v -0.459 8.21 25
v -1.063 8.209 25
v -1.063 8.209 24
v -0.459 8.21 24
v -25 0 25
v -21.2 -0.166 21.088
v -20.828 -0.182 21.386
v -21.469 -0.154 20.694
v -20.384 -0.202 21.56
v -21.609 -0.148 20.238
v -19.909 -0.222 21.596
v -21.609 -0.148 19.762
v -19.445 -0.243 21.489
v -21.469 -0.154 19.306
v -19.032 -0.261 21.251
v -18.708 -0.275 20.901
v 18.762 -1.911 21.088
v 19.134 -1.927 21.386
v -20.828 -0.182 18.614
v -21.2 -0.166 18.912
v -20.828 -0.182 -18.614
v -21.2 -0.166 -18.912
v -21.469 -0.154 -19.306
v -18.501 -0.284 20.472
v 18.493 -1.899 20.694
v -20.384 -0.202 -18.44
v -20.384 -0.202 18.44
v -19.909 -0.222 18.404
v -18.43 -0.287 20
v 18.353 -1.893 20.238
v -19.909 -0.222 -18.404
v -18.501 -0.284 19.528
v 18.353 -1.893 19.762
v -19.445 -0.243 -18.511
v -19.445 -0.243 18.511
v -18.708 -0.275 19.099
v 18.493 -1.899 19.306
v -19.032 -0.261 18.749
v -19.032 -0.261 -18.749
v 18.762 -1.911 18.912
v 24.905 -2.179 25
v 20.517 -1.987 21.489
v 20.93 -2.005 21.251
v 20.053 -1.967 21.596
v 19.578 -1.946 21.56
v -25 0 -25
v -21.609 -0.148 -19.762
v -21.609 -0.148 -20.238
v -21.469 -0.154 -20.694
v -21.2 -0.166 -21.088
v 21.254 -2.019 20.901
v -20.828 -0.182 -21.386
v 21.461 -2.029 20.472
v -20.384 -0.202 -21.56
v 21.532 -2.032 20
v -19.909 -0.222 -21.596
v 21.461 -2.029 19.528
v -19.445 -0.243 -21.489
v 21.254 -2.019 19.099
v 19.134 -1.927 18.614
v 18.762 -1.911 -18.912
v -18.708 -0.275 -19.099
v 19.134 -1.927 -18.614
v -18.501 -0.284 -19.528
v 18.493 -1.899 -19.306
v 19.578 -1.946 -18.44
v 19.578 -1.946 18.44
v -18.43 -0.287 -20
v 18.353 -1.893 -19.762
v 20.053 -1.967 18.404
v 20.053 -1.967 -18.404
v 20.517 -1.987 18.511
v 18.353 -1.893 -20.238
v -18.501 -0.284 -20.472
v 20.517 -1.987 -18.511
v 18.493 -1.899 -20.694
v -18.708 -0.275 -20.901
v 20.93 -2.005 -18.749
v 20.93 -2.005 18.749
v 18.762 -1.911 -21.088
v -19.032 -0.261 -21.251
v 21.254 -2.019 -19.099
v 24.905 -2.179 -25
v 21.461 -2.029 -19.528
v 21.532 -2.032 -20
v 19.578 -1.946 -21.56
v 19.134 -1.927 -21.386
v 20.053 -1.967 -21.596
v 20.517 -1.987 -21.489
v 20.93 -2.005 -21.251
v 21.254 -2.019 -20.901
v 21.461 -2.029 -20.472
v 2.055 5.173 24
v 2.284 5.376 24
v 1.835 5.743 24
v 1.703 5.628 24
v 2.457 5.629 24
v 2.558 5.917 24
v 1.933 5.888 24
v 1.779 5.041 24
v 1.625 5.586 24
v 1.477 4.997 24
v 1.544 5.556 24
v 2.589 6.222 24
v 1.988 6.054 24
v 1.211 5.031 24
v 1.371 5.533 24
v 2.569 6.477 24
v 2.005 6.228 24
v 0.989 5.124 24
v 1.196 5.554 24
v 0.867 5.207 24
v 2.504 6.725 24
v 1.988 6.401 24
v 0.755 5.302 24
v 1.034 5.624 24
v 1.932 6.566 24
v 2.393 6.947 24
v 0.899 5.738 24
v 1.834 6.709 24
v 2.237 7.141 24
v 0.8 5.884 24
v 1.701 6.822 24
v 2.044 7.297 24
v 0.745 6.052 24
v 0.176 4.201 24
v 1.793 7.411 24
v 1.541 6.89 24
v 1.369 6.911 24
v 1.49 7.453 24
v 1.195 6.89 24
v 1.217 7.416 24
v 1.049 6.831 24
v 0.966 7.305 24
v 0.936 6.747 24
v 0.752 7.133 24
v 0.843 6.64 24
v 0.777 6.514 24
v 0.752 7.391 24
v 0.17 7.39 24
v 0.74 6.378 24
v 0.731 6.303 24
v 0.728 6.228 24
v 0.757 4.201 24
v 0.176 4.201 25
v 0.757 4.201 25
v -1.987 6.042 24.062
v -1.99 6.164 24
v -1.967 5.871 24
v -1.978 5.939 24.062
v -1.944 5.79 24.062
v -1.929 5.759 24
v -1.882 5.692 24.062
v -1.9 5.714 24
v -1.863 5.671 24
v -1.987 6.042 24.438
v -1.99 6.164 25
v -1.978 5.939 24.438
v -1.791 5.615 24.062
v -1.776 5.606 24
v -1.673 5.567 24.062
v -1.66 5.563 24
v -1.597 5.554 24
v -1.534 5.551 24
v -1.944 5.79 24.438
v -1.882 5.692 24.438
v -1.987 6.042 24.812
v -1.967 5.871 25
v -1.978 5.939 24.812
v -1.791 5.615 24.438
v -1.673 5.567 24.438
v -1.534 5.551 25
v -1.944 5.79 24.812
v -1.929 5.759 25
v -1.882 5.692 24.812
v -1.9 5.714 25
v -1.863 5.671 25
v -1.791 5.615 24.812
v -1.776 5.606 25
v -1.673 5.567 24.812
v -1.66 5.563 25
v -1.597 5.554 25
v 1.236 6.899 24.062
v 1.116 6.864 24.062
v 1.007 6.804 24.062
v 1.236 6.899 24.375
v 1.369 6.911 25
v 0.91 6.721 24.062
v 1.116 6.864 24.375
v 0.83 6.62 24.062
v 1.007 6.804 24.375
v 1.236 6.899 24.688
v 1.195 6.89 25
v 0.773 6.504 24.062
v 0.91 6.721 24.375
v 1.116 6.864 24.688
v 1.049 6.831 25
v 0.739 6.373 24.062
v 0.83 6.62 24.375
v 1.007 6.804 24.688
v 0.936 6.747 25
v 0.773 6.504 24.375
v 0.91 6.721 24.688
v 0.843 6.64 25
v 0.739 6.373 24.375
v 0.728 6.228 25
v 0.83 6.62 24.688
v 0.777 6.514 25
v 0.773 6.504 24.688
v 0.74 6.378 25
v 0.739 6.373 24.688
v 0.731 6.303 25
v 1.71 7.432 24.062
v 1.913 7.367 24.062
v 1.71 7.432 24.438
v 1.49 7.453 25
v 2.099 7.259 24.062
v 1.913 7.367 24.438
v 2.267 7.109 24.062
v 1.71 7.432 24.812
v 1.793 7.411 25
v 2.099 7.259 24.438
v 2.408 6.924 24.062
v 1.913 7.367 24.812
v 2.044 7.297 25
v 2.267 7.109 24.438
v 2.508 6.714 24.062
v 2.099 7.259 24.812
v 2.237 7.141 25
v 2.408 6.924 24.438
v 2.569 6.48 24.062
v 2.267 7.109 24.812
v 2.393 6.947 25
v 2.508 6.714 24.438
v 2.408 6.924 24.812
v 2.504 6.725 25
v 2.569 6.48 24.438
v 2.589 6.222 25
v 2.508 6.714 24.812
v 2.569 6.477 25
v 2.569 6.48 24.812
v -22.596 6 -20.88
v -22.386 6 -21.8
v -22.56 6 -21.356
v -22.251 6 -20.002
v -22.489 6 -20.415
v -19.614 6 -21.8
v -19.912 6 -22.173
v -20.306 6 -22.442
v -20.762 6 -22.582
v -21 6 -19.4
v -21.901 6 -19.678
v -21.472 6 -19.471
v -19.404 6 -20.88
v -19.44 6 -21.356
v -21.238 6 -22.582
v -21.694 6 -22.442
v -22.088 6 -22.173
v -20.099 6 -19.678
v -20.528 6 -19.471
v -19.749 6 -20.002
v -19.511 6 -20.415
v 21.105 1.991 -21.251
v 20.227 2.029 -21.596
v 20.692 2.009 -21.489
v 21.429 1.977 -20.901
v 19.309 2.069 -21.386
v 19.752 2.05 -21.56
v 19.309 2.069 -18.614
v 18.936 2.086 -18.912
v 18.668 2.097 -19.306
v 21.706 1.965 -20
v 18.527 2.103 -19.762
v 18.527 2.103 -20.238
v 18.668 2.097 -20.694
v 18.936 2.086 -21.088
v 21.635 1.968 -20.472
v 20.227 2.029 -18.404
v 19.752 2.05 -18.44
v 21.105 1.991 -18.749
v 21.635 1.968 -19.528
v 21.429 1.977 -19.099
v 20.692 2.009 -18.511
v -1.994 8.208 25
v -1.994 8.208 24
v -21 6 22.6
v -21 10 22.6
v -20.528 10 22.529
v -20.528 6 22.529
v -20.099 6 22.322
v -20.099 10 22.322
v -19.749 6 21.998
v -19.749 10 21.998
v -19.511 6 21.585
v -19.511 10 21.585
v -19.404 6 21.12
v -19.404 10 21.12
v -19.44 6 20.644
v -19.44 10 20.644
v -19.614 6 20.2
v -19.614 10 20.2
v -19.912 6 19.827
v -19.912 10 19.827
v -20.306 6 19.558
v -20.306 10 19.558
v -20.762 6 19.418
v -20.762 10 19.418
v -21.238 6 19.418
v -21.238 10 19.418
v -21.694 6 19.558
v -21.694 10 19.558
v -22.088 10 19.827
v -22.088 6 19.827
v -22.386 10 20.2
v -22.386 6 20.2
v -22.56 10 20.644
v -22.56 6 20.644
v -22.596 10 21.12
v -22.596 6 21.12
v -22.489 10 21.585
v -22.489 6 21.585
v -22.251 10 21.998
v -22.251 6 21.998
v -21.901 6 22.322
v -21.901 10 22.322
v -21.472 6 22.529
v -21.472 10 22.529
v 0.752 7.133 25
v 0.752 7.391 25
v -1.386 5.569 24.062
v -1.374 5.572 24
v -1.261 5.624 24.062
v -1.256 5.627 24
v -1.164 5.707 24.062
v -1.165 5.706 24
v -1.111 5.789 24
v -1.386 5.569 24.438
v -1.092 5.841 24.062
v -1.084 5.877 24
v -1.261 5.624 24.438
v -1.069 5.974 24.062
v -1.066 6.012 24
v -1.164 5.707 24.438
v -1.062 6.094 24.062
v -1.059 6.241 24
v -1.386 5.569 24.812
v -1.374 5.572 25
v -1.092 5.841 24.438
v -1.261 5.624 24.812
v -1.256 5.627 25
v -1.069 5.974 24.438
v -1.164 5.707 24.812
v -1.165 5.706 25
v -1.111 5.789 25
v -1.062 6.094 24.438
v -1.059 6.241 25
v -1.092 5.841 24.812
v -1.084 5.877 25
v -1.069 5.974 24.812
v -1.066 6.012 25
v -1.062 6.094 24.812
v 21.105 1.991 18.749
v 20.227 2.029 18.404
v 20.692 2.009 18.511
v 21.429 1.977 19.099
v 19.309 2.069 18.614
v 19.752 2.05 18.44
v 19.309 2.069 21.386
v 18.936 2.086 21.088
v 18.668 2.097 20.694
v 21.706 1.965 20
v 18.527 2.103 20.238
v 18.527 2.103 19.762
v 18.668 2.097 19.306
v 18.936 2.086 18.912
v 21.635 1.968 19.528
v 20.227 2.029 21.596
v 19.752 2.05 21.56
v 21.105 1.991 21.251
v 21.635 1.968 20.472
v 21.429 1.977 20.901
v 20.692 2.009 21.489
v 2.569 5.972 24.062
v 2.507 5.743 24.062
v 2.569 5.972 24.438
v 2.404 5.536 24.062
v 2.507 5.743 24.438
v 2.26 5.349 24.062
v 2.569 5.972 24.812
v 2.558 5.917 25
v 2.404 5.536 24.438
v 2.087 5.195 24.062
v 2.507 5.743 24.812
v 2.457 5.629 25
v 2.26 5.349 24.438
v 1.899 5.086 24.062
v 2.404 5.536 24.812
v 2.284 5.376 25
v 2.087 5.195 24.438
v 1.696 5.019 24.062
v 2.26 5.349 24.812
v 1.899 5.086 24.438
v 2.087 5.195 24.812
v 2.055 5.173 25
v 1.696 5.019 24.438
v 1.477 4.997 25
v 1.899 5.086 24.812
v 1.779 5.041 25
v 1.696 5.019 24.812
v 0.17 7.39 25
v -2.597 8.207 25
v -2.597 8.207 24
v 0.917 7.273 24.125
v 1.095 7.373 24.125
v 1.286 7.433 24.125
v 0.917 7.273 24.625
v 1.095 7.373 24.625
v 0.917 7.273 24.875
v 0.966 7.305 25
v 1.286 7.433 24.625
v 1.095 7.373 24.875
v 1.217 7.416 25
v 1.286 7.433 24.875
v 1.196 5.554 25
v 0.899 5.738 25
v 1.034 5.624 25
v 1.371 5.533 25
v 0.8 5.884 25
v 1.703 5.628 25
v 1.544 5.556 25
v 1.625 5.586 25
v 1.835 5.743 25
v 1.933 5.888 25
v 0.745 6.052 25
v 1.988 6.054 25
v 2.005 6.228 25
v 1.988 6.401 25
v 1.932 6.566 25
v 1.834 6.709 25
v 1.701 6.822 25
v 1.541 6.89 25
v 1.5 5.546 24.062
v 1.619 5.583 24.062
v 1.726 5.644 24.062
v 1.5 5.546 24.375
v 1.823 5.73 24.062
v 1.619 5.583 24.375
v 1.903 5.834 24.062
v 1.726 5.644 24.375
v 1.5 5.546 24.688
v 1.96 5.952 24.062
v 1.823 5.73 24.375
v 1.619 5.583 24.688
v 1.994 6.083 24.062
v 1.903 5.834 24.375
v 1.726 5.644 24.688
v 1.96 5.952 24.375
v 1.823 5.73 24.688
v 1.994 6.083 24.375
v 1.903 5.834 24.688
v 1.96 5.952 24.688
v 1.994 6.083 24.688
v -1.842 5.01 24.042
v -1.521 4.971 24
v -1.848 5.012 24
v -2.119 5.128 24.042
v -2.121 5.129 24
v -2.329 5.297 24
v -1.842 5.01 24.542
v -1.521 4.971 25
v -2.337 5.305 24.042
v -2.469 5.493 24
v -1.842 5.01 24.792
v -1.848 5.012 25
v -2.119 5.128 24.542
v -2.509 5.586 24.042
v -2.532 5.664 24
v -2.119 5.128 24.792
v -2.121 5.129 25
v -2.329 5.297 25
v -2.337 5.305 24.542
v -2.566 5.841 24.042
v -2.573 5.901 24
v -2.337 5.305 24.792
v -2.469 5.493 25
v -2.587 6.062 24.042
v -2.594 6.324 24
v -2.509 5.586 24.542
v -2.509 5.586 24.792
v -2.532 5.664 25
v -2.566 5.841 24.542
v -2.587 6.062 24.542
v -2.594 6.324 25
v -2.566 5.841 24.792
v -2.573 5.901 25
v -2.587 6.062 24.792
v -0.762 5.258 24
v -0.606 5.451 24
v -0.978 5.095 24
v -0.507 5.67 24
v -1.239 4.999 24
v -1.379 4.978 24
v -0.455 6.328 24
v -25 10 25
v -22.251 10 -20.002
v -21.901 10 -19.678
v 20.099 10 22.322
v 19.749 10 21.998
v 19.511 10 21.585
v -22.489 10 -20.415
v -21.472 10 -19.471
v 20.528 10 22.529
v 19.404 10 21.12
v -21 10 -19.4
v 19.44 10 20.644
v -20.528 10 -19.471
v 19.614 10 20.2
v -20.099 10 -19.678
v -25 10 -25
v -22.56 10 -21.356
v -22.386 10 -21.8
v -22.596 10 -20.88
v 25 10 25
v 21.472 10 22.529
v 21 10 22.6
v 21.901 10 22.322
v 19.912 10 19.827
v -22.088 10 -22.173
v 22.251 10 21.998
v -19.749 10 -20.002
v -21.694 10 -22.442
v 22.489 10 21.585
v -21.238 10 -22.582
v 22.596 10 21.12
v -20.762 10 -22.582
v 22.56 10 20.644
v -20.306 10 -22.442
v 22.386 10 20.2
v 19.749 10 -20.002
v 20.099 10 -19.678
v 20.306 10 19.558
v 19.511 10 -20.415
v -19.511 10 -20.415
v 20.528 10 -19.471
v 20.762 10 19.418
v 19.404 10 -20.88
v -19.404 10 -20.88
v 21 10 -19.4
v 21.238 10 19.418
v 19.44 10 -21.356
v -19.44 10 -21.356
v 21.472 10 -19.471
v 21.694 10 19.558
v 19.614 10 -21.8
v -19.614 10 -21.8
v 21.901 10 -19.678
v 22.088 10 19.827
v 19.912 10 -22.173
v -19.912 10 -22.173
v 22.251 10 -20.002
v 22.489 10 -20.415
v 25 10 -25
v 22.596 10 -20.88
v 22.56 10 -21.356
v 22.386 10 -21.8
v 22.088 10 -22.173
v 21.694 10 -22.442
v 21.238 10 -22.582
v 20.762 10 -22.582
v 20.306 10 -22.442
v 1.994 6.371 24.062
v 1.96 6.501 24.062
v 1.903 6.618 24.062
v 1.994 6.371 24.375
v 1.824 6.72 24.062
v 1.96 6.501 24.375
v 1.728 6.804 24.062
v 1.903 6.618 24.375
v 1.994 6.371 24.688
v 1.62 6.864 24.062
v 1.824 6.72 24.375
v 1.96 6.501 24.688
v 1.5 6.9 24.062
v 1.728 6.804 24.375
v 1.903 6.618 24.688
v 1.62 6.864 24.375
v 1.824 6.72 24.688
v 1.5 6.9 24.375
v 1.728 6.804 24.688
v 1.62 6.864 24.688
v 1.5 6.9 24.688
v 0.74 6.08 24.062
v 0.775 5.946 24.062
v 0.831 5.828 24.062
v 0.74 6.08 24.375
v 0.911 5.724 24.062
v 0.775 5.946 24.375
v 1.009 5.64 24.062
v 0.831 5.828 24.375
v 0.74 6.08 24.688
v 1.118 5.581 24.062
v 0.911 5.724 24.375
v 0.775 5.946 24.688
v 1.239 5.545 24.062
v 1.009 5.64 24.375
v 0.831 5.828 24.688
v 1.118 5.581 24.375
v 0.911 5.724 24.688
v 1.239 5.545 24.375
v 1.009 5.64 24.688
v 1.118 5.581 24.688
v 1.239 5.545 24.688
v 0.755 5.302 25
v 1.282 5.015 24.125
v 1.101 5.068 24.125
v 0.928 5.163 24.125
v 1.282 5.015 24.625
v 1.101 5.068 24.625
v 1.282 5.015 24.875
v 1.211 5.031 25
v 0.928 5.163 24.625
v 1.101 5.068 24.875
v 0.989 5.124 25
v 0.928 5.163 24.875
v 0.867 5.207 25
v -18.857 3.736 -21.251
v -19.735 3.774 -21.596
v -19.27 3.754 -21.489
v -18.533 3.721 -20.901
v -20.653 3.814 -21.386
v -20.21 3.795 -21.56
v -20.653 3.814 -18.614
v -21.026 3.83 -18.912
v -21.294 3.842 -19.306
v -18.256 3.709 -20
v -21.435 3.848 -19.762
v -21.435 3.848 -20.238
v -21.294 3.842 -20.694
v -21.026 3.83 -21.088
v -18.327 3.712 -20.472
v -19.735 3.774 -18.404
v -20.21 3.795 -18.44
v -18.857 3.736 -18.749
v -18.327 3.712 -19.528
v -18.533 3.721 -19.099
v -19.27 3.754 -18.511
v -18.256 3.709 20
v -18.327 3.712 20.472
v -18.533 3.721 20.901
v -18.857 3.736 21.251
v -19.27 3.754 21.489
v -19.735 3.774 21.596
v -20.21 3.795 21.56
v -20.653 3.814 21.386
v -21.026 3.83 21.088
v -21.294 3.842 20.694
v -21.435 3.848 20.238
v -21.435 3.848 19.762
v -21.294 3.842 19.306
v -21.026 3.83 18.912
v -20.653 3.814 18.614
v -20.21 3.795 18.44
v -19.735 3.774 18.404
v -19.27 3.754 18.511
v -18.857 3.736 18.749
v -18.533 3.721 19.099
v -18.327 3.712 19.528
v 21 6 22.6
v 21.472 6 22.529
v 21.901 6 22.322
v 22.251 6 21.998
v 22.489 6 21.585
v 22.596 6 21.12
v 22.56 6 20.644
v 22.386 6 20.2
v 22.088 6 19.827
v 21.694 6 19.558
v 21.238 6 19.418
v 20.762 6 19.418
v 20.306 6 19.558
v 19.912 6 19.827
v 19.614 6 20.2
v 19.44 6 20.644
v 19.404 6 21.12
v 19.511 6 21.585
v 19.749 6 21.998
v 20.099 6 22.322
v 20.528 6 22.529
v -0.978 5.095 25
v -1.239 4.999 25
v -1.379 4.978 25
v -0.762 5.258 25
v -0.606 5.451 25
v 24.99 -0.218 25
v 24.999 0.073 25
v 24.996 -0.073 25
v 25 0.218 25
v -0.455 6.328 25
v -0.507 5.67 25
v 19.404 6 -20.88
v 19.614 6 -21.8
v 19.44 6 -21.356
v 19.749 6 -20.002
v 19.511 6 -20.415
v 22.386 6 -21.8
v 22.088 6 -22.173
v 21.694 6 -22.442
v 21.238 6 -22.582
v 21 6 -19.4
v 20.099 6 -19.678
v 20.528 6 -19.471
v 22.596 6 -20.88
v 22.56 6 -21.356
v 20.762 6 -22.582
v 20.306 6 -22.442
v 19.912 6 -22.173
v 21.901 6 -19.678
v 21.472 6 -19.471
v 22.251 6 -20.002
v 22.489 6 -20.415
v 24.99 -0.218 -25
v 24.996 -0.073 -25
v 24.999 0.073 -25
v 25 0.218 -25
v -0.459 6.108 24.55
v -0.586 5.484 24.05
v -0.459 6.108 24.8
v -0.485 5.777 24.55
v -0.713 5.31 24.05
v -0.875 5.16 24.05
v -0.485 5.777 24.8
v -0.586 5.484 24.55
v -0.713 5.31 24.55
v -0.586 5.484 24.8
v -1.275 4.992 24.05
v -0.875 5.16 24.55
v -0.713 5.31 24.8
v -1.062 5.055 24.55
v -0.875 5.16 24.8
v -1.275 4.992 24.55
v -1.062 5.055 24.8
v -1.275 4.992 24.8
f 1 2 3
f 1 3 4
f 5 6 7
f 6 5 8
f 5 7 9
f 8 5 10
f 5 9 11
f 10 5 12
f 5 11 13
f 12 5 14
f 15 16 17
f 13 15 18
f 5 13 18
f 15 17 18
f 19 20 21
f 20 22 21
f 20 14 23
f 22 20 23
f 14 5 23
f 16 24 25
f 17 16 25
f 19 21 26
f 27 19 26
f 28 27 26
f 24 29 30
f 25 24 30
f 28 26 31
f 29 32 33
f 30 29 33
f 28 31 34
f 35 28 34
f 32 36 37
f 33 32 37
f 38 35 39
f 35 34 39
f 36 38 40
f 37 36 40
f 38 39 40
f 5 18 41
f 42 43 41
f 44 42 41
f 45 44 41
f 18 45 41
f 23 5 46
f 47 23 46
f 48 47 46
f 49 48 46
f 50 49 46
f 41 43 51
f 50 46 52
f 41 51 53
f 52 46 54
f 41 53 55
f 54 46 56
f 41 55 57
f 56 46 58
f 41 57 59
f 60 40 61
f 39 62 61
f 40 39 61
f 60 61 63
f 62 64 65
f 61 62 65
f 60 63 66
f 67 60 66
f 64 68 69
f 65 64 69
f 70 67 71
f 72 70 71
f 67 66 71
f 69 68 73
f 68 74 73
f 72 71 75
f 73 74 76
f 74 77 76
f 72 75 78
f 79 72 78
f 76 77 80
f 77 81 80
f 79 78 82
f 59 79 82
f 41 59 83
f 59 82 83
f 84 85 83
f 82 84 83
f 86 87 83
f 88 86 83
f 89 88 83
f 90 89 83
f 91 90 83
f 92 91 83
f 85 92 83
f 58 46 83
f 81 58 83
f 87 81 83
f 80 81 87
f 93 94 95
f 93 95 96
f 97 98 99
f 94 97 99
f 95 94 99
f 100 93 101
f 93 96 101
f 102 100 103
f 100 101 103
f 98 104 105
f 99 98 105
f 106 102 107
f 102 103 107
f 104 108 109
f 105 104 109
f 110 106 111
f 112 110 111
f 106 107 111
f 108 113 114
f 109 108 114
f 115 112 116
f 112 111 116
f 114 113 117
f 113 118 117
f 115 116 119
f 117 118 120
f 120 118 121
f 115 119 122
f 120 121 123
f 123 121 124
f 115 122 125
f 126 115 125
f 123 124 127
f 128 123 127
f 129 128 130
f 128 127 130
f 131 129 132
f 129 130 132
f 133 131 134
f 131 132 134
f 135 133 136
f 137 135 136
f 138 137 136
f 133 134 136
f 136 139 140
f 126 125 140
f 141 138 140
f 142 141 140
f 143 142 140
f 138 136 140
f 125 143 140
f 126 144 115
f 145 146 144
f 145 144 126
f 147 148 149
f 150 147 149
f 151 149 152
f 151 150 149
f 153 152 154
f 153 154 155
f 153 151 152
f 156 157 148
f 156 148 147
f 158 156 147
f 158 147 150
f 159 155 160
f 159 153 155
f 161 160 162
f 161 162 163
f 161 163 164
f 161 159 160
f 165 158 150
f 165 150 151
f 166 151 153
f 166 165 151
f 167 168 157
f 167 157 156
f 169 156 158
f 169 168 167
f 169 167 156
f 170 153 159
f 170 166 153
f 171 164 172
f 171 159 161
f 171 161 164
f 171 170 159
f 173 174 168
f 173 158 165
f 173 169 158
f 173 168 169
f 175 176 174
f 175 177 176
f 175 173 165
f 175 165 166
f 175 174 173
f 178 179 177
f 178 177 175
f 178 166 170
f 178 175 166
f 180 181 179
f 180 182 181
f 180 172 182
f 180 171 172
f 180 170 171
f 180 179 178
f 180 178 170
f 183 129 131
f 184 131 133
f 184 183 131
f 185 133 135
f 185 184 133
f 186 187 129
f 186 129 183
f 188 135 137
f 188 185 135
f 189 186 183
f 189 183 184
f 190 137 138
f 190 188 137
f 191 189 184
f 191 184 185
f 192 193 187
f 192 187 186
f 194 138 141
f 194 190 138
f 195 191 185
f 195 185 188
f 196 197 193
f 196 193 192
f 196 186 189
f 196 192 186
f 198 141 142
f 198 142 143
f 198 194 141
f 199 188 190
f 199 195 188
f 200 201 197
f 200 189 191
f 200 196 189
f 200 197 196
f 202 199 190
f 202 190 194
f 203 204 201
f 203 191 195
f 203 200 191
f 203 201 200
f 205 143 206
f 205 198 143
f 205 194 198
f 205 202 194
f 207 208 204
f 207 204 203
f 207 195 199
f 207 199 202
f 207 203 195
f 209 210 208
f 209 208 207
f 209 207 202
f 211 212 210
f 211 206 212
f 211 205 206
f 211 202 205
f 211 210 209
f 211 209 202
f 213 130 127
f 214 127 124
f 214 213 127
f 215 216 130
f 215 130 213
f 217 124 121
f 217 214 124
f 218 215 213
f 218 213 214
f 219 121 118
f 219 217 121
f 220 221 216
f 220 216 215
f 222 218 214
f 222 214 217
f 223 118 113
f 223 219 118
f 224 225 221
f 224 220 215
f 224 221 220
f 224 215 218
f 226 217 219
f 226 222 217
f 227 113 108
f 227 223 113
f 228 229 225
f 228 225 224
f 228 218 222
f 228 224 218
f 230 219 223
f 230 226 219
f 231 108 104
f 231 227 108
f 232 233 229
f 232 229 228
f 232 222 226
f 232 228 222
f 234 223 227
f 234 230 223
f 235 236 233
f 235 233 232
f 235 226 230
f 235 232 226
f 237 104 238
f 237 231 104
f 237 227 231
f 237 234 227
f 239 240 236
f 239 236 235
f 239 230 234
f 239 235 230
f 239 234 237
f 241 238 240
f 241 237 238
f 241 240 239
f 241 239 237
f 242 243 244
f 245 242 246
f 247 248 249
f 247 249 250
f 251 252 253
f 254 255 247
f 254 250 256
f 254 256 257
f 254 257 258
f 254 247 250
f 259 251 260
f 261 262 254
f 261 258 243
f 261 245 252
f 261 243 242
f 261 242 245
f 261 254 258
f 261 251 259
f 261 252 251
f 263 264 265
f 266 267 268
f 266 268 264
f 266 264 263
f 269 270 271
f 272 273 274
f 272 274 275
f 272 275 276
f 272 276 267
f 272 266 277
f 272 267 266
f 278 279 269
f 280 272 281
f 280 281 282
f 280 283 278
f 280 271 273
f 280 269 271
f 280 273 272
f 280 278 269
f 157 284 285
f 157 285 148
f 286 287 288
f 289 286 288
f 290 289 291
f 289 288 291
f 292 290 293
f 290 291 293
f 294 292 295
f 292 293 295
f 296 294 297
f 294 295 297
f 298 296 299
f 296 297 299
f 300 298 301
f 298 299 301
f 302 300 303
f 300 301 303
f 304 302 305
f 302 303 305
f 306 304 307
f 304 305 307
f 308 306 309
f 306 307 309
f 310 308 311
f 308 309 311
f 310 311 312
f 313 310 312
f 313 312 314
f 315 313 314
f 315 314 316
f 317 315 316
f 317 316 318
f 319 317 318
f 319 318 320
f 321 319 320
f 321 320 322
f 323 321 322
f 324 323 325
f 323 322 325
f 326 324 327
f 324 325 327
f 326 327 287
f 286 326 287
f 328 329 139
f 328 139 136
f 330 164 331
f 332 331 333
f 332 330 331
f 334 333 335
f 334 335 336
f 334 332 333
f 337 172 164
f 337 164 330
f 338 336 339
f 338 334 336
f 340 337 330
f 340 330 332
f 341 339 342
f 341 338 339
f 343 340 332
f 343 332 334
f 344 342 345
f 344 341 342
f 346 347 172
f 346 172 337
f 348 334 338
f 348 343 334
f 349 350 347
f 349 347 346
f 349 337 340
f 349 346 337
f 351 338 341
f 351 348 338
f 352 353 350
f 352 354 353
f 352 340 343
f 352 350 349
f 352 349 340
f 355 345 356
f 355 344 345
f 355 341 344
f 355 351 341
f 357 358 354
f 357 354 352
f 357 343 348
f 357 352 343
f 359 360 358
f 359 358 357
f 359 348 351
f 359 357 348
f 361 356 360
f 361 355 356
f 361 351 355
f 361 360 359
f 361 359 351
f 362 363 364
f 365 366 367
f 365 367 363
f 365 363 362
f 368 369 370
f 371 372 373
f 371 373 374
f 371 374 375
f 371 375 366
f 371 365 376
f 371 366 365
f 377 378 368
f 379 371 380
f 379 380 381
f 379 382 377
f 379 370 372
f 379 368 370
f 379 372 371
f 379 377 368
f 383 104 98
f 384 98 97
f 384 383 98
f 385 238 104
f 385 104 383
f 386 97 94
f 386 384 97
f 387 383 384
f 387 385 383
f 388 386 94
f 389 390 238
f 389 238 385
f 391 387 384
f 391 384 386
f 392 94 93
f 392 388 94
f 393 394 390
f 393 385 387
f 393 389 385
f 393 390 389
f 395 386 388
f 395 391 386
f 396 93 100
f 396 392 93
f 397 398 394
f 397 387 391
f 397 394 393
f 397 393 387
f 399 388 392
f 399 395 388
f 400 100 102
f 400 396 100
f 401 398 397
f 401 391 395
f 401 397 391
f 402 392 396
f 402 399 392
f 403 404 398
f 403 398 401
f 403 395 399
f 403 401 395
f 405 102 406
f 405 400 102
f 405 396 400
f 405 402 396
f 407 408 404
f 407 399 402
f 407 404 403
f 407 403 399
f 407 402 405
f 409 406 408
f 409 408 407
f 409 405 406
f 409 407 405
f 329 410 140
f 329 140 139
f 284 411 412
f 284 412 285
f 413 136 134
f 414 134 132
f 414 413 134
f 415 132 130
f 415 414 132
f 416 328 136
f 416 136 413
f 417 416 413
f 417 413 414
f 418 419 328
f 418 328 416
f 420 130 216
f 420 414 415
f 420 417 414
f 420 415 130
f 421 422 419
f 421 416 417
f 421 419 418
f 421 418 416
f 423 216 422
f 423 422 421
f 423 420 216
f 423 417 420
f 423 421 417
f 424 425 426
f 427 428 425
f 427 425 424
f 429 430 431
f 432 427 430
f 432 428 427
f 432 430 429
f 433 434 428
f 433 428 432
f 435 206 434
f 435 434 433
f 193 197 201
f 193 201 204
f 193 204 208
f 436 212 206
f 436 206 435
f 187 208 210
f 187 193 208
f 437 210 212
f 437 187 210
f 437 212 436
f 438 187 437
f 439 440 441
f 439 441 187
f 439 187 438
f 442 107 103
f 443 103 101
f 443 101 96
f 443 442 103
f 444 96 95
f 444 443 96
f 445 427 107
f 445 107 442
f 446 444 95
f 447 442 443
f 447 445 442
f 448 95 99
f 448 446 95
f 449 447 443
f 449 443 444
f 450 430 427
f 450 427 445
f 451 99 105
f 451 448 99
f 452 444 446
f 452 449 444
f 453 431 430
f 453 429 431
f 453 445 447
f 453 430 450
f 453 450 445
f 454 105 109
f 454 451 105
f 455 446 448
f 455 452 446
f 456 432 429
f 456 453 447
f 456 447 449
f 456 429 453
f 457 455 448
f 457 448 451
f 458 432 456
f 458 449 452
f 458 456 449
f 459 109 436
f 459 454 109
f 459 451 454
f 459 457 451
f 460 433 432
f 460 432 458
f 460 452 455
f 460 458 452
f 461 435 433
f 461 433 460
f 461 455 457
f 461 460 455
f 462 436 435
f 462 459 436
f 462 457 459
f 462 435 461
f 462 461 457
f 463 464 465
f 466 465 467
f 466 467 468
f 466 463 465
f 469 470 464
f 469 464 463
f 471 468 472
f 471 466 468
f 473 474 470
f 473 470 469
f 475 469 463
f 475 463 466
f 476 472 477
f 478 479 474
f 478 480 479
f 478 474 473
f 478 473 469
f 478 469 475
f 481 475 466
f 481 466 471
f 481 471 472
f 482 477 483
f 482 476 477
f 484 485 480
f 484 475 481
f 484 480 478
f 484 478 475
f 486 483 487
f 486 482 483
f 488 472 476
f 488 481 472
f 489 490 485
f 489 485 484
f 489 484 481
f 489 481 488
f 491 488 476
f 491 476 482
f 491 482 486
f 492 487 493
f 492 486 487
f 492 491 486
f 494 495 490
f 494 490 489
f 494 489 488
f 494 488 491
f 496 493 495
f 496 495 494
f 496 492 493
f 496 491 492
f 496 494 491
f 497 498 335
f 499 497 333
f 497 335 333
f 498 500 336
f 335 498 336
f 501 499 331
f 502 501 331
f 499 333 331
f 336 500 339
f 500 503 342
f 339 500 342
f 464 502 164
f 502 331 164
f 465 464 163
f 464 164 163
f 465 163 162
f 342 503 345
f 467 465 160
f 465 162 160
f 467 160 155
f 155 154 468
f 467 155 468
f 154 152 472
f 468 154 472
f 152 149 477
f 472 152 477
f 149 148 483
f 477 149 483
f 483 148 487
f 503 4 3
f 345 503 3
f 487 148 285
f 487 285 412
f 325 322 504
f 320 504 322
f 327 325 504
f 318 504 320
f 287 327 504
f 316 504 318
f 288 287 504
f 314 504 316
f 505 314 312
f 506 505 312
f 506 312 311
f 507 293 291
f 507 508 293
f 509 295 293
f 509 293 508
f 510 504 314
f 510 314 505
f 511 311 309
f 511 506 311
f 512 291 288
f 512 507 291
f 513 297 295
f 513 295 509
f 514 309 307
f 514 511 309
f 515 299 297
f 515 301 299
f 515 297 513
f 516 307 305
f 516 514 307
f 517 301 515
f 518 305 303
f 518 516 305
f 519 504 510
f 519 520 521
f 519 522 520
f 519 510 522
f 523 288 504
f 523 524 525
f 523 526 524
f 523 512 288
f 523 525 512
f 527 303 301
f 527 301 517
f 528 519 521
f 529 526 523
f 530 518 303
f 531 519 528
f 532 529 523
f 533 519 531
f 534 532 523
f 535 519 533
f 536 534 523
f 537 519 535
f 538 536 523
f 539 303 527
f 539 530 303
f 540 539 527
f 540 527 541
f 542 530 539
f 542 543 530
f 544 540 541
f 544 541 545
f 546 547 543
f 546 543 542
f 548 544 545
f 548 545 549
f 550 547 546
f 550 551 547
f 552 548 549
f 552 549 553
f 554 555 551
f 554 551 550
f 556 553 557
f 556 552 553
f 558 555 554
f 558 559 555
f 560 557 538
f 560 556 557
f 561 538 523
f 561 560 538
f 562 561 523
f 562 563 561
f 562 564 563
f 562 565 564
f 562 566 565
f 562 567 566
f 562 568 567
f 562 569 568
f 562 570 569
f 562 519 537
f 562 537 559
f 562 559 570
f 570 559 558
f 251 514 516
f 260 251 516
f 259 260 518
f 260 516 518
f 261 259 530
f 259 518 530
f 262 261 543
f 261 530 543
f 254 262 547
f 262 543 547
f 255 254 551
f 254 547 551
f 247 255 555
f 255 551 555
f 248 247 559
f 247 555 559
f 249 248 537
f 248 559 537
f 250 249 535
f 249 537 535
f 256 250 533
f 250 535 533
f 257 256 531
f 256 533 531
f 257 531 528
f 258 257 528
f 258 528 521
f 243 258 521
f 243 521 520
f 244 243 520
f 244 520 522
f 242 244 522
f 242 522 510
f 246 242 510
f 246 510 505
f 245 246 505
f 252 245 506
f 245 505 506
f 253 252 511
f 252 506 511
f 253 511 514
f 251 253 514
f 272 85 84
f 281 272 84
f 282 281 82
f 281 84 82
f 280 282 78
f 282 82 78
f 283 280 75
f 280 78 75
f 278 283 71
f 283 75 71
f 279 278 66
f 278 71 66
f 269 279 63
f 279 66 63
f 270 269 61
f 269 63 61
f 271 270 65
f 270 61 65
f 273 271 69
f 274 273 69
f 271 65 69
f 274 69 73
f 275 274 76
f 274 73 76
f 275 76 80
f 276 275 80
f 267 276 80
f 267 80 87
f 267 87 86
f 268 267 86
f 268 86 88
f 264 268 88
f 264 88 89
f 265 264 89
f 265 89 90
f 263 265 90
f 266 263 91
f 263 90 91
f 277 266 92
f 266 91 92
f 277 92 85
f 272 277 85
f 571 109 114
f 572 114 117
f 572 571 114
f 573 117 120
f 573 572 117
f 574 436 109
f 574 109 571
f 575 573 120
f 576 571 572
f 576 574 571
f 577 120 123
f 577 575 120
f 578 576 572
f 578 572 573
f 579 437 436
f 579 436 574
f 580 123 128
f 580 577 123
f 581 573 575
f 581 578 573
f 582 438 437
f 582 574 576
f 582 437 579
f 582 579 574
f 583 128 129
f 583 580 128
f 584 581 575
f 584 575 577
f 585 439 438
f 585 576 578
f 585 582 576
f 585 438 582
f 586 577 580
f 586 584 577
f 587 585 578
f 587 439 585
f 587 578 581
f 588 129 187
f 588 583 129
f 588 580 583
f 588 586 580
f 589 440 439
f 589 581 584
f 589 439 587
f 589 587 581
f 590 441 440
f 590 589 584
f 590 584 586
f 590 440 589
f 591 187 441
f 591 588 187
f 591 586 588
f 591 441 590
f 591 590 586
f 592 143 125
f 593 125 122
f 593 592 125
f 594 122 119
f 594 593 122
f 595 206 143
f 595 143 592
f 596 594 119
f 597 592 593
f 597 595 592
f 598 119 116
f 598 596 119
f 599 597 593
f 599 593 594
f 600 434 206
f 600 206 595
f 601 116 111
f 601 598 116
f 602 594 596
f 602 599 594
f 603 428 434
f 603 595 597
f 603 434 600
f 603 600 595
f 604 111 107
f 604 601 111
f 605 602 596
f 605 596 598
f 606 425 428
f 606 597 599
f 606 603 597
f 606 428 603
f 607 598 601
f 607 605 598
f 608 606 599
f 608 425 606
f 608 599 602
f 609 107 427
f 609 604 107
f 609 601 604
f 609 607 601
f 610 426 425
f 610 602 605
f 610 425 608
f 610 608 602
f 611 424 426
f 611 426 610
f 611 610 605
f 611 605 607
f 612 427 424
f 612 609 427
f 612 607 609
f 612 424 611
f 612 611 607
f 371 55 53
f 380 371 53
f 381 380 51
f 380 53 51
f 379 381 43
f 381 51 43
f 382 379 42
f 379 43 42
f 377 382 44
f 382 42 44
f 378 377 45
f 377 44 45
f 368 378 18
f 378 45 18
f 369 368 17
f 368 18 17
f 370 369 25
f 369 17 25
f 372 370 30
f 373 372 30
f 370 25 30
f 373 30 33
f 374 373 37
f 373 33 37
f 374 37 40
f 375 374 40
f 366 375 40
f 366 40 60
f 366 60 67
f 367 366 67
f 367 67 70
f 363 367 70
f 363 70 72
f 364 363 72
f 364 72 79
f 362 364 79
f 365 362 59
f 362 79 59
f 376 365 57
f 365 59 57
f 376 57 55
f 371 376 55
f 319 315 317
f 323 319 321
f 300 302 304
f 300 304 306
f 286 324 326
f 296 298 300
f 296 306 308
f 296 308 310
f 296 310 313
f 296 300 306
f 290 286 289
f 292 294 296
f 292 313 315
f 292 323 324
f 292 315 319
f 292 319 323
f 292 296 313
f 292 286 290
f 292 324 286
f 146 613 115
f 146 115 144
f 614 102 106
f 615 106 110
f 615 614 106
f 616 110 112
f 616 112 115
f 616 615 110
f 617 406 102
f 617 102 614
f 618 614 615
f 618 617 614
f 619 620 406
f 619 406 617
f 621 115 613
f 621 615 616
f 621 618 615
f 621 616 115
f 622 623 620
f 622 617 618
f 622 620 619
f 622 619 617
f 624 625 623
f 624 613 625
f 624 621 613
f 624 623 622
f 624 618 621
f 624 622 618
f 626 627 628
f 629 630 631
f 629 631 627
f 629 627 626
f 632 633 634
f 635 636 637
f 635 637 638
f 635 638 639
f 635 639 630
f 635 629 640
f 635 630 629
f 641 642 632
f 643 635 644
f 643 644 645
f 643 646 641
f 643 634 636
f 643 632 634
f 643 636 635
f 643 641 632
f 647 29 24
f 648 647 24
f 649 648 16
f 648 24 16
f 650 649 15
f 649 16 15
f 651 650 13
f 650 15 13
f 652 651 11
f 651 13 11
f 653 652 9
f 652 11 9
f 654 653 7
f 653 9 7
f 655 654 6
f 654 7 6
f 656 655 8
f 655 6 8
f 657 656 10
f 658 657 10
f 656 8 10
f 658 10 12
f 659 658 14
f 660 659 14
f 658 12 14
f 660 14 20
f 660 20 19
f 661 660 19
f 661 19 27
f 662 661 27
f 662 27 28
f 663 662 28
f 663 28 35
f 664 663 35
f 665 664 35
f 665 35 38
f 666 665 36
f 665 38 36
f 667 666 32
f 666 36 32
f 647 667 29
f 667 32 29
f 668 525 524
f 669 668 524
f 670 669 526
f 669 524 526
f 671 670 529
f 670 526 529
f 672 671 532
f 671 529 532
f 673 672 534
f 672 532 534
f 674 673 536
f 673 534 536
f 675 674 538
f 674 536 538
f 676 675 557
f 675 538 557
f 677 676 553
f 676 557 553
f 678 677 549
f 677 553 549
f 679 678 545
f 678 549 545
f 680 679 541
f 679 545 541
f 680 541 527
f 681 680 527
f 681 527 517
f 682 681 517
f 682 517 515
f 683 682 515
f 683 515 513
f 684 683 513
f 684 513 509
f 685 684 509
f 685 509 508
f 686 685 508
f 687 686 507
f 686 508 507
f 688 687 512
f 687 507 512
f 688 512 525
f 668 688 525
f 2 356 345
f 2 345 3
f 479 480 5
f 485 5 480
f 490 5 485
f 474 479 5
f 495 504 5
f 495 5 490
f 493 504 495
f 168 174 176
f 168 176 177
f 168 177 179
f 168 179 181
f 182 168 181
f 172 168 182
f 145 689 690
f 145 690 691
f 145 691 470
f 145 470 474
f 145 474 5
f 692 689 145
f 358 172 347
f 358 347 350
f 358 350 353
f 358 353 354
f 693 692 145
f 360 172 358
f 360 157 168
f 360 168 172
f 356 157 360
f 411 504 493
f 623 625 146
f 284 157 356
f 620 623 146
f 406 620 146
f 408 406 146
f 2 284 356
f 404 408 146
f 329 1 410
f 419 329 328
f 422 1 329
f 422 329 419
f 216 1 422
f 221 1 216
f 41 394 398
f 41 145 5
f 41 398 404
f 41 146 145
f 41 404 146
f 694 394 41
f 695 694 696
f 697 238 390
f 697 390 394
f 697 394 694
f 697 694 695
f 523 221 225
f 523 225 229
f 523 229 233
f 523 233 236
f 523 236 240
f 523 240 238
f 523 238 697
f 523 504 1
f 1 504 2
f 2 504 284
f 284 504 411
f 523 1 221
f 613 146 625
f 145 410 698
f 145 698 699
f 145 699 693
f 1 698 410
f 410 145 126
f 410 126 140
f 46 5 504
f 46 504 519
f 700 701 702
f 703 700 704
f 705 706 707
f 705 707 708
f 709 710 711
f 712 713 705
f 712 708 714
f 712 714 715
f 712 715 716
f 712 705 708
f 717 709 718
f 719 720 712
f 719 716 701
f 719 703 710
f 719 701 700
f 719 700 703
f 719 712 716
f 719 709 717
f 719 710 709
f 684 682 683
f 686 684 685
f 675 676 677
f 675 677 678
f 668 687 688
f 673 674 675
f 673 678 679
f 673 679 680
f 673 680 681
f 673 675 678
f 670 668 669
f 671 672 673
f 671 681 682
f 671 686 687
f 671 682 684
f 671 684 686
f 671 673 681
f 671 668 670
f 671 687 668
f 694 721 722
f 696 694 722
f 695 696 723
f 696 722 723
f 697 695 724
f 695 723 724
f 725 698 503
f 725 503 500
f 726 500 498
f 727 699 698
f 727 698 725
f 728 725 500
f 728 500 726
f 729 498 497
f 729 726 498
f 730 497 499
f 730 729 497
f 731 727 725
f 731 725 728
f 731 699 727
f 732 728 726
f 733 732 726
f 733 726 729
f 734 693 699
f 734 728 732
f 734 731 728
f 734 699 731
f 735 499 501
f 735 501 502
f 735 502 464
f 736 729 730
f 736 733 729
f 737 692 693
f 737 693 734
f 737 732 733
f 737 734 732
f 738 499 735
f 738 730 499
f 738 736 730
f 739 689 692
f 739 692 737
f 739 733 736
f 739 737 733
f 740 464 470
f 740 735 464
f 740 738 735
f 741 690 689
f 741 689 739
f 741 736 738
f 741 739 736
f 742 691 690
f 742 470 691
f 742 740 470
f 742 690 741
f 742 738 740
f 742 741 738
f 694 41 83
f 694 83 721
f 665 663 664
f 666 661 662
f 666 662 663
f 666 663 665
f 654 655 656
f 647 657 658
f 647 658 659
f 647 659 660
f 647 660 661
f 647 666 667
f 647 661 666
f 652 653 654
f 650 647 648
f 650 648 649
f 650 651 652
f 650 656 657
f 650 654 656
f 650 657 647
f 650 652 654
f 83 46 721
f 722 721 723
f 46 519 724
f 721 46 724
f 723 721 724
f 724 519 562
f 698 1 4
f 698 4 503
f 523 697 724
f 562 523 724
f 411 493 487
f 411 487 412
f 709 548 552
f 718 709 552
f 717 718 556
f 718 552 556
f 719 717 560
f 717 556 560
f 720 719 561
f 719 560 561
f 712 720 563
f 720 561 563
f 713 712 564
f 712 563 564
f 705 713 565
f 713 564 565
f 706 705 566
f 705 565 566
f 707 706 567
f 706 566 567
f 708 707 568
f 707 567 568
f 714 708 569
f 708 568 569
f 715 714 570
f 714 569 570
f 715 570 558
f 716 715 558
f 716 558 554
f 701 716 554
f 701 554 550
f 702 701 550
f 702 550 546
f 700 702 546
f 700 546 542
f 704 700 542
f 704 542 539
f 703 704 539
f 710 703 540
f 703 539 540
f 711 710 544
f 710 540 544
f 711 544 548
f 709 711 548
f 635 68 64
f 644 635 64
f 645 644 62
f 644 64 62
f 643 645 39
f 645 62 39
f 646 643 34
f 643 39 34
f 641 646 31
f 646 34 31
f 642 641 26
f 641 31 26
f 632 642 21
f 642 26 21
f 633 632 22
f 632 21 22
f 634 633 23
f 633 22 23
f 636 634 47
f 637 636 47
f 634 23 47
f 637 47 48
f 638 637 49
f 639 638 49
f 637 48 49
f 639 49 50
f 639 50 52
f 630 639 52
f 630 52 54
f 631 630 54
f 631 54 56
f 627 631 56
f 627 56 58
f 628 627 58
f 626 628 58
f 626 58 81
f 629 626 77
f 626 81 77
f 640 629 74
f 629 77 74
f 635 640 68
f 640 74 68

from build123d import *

# Parameters (mm, degrees)
SKETCH1_W           = 50
SKETCH1_H           = 50
BOSS_EXTRUDE1_DEPTH = 10
LOFT1_START         = -25
LOFT1_DEPTH         = 50
SKETCH4_R           = 1.6
CUT_EXTRUDE1_DEPTH  = 4
SKETCH6_R           = 1.6
CUT_EXTRUDE2_DEPTH  = 4
FILLET1_R           = 10
CUT_EXTRUDE4_DEPTH  = 1


# Read off the part's stored shape, not the designer's step: Loft1
with BuildPart() as part:
    # Sketch1 → Boss-Extrude1 (new body)
    with BuildSketch(Plane(origin=(0, 0, 0), x_dir=(1, 0, 0), z_dir=(0, 1, 0))):
        Rectangle(SKETCH1_W, SKETCH1_H)
    extrude(amount=BOSS_EXTRUDE1_DEPTH)

    # Loft1 outline → Loft1 (add)
    with BuildSketch(Plane.XY.offset(LOFT1_START)):
        Polygon((25, 0), (-25, 0), (24.904867452, -2.178893569), align=None)
    extrude(amount=LOFT1_DEPTH)

    # Sketch4 → Cut-Extrude1 (cut)
    with BuildSketch(Plane(origin=(-0.047566274, -1.089446784, 0), x_dir=(0.9990482215818578, -0.043619387365336104, 0), z_dir=(-0.043619387365336104, -0.9990482215818578, 0))):
        with Locations((20, 20)):
            Circle(SKETCH4_R)
        with Locations((20, -20)):
            Circle(SKETCH4_R)
        with Locations((-20, -20)):
            Circle(SKETCH4_R)
        with Locations((-20, 20)):
            Circle(SKETCH4_R)
    extrude(amount=-CUT_EXTRUDE1_DEPTH, mode=Mode.SUBTRACT)

    # Sketch6 → Cut-Extrude2 (cut)
    with BuildSketch(Plane(origin=(0, 10, 0), x_dir=(1, 0, 0), z_dir=(0, 1, 0))):
        with Locations(Location((21, 21, 0), (0, 0, 270))):
            Circle(SKETCH6_R)
        with Locations(Location((21, -21, 0), (0, 0, 270))):
            Circle(SKETCH6_R)
        with Locations(Location((-21, -21, 0), (0, 0, 270))):
            Circle(SKETCH6_R)
        with Locations(Location((-21, 21, 0), (0, 0, 270))):
            Circle(SKETCH6_R)
    extrude(amount=-CUT_EXTRUDE2_DEPTH, mode=Mode.SUBTRACT)

    # Fillet1
    # the kernel refuses this fillet: 10 mm, written as the material it takes off along each edge
    with BuildSketch(Plane(origin=(25, 0, -25.545501942), x_dir=(0, 1, 0), z_dir=(0, 0, 1))) as fillet1_piece_1:
        with BuildLine():
            CenterArc((FILLET1_R * 0.0218200776863, FILLET1_R), FILLET1_R, 267.499999993, 2.500000007)
            Line((-FILLET1_R * 0.0217993098072, FILLET1_R * 0.00095177842374), (0, 0))
            Line((0, 0), (FILLET1_R * 0.0218200776863, 0))
        make_face()
    extrude(amount=51.091003884, mode=Mode.SUBTRACT)

    # Sketch8 → Cut-Extrude4 (cut)
    # profile 1 of 2: a face of its own
    with BuildSketch(Plane.XY.offset(25)):
        with BuildLine():
            Line((-2.597489017, 8.20661879), (-1.993908288, 8.207890825))
            Line((-1.993908288, 8.207890825), (-1.990092182, 6.164366186))
            add(Edge.make_bspline(
                [(-1.990092182, 6.164366186), (-1.990044981, 6.143161949), (-1.989954316, 6.102432362), (-1.98719006, 6.043693532), (-1.983535675, 5.989812448), (-1.978474748, 5.940590206), (-1.972213443, 5.896230054), (-1.964810654, 5.856420037), (-1.955356589, 5.821562302), (-1.941074869, 5.781805473), (-1.918545267, 5.737393222), (-1.88297912, 5.690959505), (-1.840900192, 5.649204853), (-1.791278495, 5.613903537), (-1.735063778, 5.584986173), (-1.672775576, 5.56486761), (-1.605162185, 5.552435164), (-1.558292927, 5.551231377), (-1.534067542, 5.550609174)],
                knots=[0, 0, 0, 0, 1.152644125, 2.214025477, 3.196161738, 4.088430453, 4.903432181, 5.631297626, 6.288373025, 6.86443571, 7.926317597, 8.979784177, 10.031167994, 11.137891127, 12.27708747, 13.454363037, 14.684232779, 16, 16, 16, 16], degree=3))
            add(Edge.make_bspline(
                [(-1.534067542, 5.550609174), (-1.508342778, 5.551344218), (-1.458392144, 5.552771477), (-1.38647613, 5.567260105), (-1.320175779, 5.590067607), (-1.260159607, 5.621972608), (-1.207784977, 5.661229411), (-1.163051106, 5.705642718), (-1.126756521, 5.754903538), (-1.104539344, 5.801287384), (-1.090919789, 5.843176805), (-1.082446638, 5.881122654), (-1.074798653, 5.925478097), (-1.068502962, 5.975979624), (-1.064302042, 6.033085663), (-1.061178272, 6.096494834), (-1.059289451, 6.166474936), (-1.059074503, 6.215246414), (-1.058962374, 6.240688301)],
                knots=[0, 0, 0, 0, 1.271674988, 2.469253807, 3.614054625, 4.731162594, 5.818153213, 6.841986676, 7.840949062, 8.831111795, 9.371942087, 10.018382253, 10.75320863, 11.599114249, 12.535801032, 13.586328523, 14.740896136, 16, 16, 16, 16], degree=3))
            Line((-1.058962374, 6.240688301), (-1.06277848, 8.20916286))
            Line((-1.06277848, 8.20916286), (-0.459197751, 8.210434896))
            Line((-0.459197751, 8.210434896), (-0.455381645, 6.327822716))
            add(Edge.make_bspline(
                [(-0.455381645, 6.327822716), (-0.455427497, 6.289659556), (-0.455515647, 6.21629181), (-0.458289071, 6.110918126), (-0.461814303, 6.014630937), (-0.467384408, 5.927444116), (-0.475128208, 5.849211971), (-0.483609602, 5.779962438), (-0.494254852, 5.719827409), (-0.511101496, 5.651616734), (-0.540202063, 5.573125016), (-0.584540214, 5.481851601), (-0.643443749, 5.393738081), (-0.711846857, 5.308083315), (-0.789095734, 5.22867752), (-0.873562656, 5.158654821), (-0.964207697, 5.099802482), (-1.061217352, 5.05236512), (-1.164968764, 5.015852552), (-1.276248979, 4.989816387), (-1.395852353, 4.974728231), (-1.478266961, 4.972397474), (-1.520711172, 4.971197115)],
                knots=[0, 0, 0, 0, 1.153606413, 2.21778028, 3.186276612, 4.066178262, 4.858206436, 5.562506921, 6.174709129, 6.703194428, 7.684393792, 8.699014322, 9.763766974, 10.880761115, 12.0092423, 13.106350137, 14.190711311, 15.268404456, 16.362982341, 17.508657393, 18.716937746, 20, 20, 20, 20], degree=3))
            add(Edge.make_bspline(
                [(-1.520711172, 4.971197115), (-1.548921319, 4.971725785), (-1.604368835, 4.972764896), (-1.686183271, 4.979779), (-1.765227448, 4.991850187), (-1.841591746, 5.008854994), (-1.914983671, 5.031425855), (-1.98589913, 5.05802141), (-2.054022722, 5.089780937), (-2.118688428, 5.126683391), (-2.179562073, 5.167512676), (-2.236618712, 5.210440833), (-2.289443467, 5.255799025), (-2.336824872, 5.304275742), (-2.38072026, 5.354640261), (-2.419200428, 5.408131493), (-2.453865888, 5.463682585), (-2.484516032, 5.522820121), (-2.511340089, 5.588612717), (-2.532761656, 5.663826937), (-2.552116951, 5.748901286), (-2.566727329, 5.844173393), (-2.578801096, 5.949614065), (-2.58762407, 6.065232271), (-2.592496247, 6.191248581), (-2.593270756, 6.278633173), (-2.593672911, 6.32400661)],
                knots=[0, 0, 0, 0, 1.02296857, 2.010661828, 2.975102012, 3.920728081, 4.844890381, 5.757306083, 6.665306112, 7.567395873, 8.454421116, 9.321634866, 10.155527794, 10.976419367, 11.777782189, 12.575893134, 13.363117526, 14.150529598, 14.988558697, 15.934809602, 16.983005217, 18.150875452, 19.427780756, 20.831133413, 22.354602744, 24, 24, 24, 24], degree=3))
            Line((-2.593672911, 6.32400661), (-2.597489017, 8.20661879))
        make_face()
    # profile 2 of 2: a face of its own
    with BuildSketch(Plane.XY.offset(25)):
        with BuildLine():
            Line((0.751773127, 7.391012504), (0.751773127, 7.133425365))
            add(Edge.make_bspline(
                [(0.751773127, 7.133425365), (0.778472329, 7.158935271), (0.83075507, 7.208889119), (0.91540949, 7.274289424), (1.003299732, 7.329052484), (1.094438334, 7.374170373), (1.188742293, 7.408966836), (1.286127124, 7.435040483), (1.386924841, 7.449591081), (1.455165046, 7.451662404), (1.489553576, 7.452706214)],
                knots=[0, 0, 0, 0, 1.07236104, 2.099912038, 3.101509264, 4.076695536, 5.049251982, 6.017409511, 7.000906107, 8, 8, 8, 8], degree=3))
            add(Edge.make_bspline(
                [(1.489553576, 7.452706214), (1.526924592, 7.451800756), (1.600743213, 7.450012213), (1.709259158, 7.433628514), (1.813580931, 7.40703223), (1.913508294, 7.369042139), (2.009538866, 7.32069025), (2.100531928, 7.260258837), (2.187555401, 7.189924161), (2.269207456, 7.10944842), (2.34355068, 7.020307883), (2.409944412, 6.92481222), (2.464182597, 6.822021375), (2.510876223, 6.7143822), (2.545388061, 6.599620476), (2.570855741, 6.479240849), (2.586463156, 6.352591682), (2.588293394, 6.266153935), (2.589228055, 6.222012103)],
                knots=[0, 0, 0, 0, 0.97285607, 1.921673578, 2.851140669, 3.772105152, 4.700636827, 5.645590137, 6.611463219, 7.611062552, 8.626324728, 9.631081099, 10.634121403, 11.648482193, 12.682506745, 13.749260973, 14.85059771, 16, 16, 16, 16], degree=3))
            add(Edge.make_bspline(
                [(2.589228055, 6.222012103), (2.588298537, 6.179349915), (2.586474919, 6.095651135), (2.570706926, 5.972853752), (2.545603057, 5.855183022), (2.509168603, 5.742953987), (2.462478649, 5.636026689), (2.405516744, 5.534470889), (2.338601572, 5.437871439), (2.261335844, 5.348453672), (2.177246838, 5.267258834), (2.089530639, 5.194426949), (1.996891996, 5.133719372), (1.900067324, 5.084592613), (1.799825884, 5.045403376), (1.695598692, 5.017296578), (1.58741629, 5.000400903), (1.513994179, 4.998170845), (1.476833223, 4.997042151)],
                knots=[0, 0, 0, 0, 1.112323361, 2.182262823, 3.223467608, 4.246437882, 5.254246404, 6.261812182, 7.278802008, 8.313998772, 9.338537047, 10.324801996, 11.283349242, 12.220607119, 13.15197435, 14.085554928, 15.031046561, 16, 16, 16, 16], degree=3))
            add(Edge.make_bspline(
                [(1.476833223, 4.997042151), (1.443713635, 4.997866298), (1.37847004, 4.999489817), (1.28239675, 5.013308287), (1.18972649, 5.035554908), (1.099816742, 5.066844085), (1.011800444, 5.108860697), (0.925752316, 5.163179132), (0.838187871, 5.226650427), (0.783321035, 5.276537488), (0.754953215, 5.302330613)],
                knots=[0, 0, 0, 0, 0.987385084, 1.945089202, 2.888259662, 3.826137757, 4.779238709, 5.78997447, 6.857349733, 8, 8, 8, 8], degree=3))
            Line((0.754953215, 5.302330613), (0.756861268, 4.201384099))
            Line((0.756861268, 4.201384099), (0.175541156, 4.200748081))
            Line((0.175541156, 4.200748081), (0.170453015, 7.390376486))
            Line((0.170453015, 7.390376486), (0.751773127, 7.391012504))
        make_face()
        with BuildLine():
            add(Edge.make_bspline(
                [(1.368710227, 6.911455212), (1.346213252, 6.910793906), (1.301889553, 6.909490995), (1.236800882, 6.900703018), (1.174825335, 6.884952495), (1.115281841, 6.865000801), (1.058891287, 6.838102927), (1.006158968, 6.804454728), (0.955302726, 6.766437156), (0.908795742, 6.721898104), (0.866041178, 6.673203682), (0.829171668, 6.620171725), (0.797662517, 6.563797157), (0.772116057, 6.503651781), (0.752619184, 6.439615962), (0.737765481, 6.372266556), (0.7295235, 6.301085467), (0.728674715, 6.252561314), (0.728240475, 6.227736262)],
                knots=[0, 0, 0, 0, 1.027737872, 2.024856463, 2.992617016, 3.945137832, 4.889499754, 5.838073507, 6.798830374, 7.785357117, 8.773878476, 9.754540506, 10.730023958, 11.719398922, 12.733354597, 13.783839577, 14.866207966, 16, 16, 16, 16], degree=3))
            add(Edge.make_bspline(
                [(0.728240475, 6.227736262), (0.728932743, 6.202275745), (0.730280627, 6.152702693), (0.738422537, 6.08005334), (0.75306485, 6.011292092), (0.773556922, 5.946234461), (0.798907779, 5.884714778), (0.830366781, 5.826871472), (0.867820106, 5.773025683), (0.91065126, 5.723370351), (0.95726968, 5.678357076), (1.007763484, 5.639224622), (1.06153695, 5.6068128), (1.1177563, 5.579922387), (1.176954499, 5.558646747), (1.239181745, 5.543528138), (1.30440737, 5.534333858), (1.348751423, 5.533585019), (1.371254297, 5.533205012)],
                knots=[0, 0, 0, 0, 1.150869826, 2.240808007, 3.29890037, 4.323262251, 5.319818076, 6.30175507, 7.2932304, 8.278527964, 9.261212744, 10.217617135, 11.159266914, 12.093623991, 13.030189547, 13.99700188, 14.983556707, 16, 16, 16, 16], degree=3))
            add(Edge.make_bspline(
                [(1.371254297, 5.533205012), (1.393128622, 5.533793245), (1.436452488, 5.534958287), (1.499904241, 5.544898072), (1.560968418, 5.559972722), (1.618912299, 5.581746332), (1.674296494, 5.609496131), (1.727218439, 5.643057943), (1.776798655, 5.683723983), (1.823930937, 5.729037604), (1.865777732, 5.77989361), (1.904183947, 5.833232179), (1.935119368, 5.891270601), (1.961360615, 5.951971312), (1.981219465, 6.016410897), (1.994773785, 6.083982305), (2.004336984, 6.154747505), (2.005017408, 6.203110383), (2.005363872, 6.227736262)],
                knots=[0, 0, 0, 0, 0.998586769, 1.977781659, 2.926627622, 3.867334799, 4.798423245, 5.752050313, 6.722974502, 7.722781292, 8.733270033, 9.727291971, 10.719614403, 11.730474272, 12.744298273, 13.79263617, 14.876033113, 16, 16, 16, 16], degree=3))
            add(Edge.make_bspline(
                [(2.005363872, 6.227736262), (2.004660421, 6.252347386), (2.003285885, 6.300437262), (1.995240688, 6.371000149), (1.980354194, 6.437720012), (1.960745423, 6.50128771), (1.935176776, 6.561395106), (1.903915874, 6.617963719), (1.867459395, 6.6715612), (1.824828199, 6.720411759), (1.778956571, 6.765724093), (1.728833044, 6.804678965), (1.676093164, 6.83793361), (1.620131268, 6.864855463), (1.561466804, 6.885779245), (1.499970245, 6.901242858), (1.435343762, 6.910334609), (1.391212006, 6.911076791), (1.368710227, 6.911455212)],
                knots=[0, 0, 0, 0, 1.128965526, 2.20598662, 3.251153905, 4.259863426, 5.253177665, 6.241051661, 7.220081141, 8.219894056, 9.210062323, 10.172878603, 11.125229178, 12.064585276, 13.014948265, 13.977126056, 14.968582519, 16, 16, 16, 16], degree=3))
        make_face(mode=Mode.SUBTRACT)
    extrude(amount=-CUT_EXTRUDE4_DEPTH, mode=Mode.SUBTRACT)


solid = part.part
